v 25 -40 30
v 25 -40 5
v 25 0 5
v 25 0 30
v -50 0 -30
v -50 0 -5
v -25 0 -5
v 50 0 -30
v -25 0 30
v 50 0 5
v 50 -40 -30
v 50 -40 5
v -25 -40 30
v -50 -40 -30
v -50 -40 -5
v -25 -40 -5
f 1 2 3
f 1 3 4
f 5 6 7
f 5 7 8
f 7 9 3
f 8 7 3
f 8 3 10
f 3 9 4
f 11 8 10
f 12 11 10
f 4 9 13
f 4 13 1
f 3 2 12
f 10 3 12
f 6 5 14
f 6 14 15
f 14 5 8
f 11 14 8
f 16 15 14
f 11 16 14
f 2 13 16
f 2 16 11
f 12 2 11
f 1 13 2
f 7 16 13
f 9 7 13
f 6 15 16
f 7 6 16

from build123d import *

# Parameters (mm, degrees)
F0_W     = 100
F0_H     = 60
F1_DEPTH = 40
F2_W     = 25
F2_H     = 35
F2_H_2   = 25
F3_DEPTH = 40.001


with BuildPart() as f1:
    # F0 (on Front) → F1 (new body)
    with BuildSketch(Plane.XZ):
        Rectangle(F0_W, F0_H)
    extrude(amount=F1_DEPTH)

    # F2 (on face) → F3 (cut, through all)
    with BuildSketch(Plane.XZ.offset(40)):
        with Locations((-37.5, 12.5)):
            Rectangle(F2_W, F2_H)
        with Locations((37.5, 17.5)):
            Rectangle(F2_W, F2_H_2)
    extrude(amount=-F3_DEPTH, mode=Mode.SUBTRACT)


solid = f1.part
